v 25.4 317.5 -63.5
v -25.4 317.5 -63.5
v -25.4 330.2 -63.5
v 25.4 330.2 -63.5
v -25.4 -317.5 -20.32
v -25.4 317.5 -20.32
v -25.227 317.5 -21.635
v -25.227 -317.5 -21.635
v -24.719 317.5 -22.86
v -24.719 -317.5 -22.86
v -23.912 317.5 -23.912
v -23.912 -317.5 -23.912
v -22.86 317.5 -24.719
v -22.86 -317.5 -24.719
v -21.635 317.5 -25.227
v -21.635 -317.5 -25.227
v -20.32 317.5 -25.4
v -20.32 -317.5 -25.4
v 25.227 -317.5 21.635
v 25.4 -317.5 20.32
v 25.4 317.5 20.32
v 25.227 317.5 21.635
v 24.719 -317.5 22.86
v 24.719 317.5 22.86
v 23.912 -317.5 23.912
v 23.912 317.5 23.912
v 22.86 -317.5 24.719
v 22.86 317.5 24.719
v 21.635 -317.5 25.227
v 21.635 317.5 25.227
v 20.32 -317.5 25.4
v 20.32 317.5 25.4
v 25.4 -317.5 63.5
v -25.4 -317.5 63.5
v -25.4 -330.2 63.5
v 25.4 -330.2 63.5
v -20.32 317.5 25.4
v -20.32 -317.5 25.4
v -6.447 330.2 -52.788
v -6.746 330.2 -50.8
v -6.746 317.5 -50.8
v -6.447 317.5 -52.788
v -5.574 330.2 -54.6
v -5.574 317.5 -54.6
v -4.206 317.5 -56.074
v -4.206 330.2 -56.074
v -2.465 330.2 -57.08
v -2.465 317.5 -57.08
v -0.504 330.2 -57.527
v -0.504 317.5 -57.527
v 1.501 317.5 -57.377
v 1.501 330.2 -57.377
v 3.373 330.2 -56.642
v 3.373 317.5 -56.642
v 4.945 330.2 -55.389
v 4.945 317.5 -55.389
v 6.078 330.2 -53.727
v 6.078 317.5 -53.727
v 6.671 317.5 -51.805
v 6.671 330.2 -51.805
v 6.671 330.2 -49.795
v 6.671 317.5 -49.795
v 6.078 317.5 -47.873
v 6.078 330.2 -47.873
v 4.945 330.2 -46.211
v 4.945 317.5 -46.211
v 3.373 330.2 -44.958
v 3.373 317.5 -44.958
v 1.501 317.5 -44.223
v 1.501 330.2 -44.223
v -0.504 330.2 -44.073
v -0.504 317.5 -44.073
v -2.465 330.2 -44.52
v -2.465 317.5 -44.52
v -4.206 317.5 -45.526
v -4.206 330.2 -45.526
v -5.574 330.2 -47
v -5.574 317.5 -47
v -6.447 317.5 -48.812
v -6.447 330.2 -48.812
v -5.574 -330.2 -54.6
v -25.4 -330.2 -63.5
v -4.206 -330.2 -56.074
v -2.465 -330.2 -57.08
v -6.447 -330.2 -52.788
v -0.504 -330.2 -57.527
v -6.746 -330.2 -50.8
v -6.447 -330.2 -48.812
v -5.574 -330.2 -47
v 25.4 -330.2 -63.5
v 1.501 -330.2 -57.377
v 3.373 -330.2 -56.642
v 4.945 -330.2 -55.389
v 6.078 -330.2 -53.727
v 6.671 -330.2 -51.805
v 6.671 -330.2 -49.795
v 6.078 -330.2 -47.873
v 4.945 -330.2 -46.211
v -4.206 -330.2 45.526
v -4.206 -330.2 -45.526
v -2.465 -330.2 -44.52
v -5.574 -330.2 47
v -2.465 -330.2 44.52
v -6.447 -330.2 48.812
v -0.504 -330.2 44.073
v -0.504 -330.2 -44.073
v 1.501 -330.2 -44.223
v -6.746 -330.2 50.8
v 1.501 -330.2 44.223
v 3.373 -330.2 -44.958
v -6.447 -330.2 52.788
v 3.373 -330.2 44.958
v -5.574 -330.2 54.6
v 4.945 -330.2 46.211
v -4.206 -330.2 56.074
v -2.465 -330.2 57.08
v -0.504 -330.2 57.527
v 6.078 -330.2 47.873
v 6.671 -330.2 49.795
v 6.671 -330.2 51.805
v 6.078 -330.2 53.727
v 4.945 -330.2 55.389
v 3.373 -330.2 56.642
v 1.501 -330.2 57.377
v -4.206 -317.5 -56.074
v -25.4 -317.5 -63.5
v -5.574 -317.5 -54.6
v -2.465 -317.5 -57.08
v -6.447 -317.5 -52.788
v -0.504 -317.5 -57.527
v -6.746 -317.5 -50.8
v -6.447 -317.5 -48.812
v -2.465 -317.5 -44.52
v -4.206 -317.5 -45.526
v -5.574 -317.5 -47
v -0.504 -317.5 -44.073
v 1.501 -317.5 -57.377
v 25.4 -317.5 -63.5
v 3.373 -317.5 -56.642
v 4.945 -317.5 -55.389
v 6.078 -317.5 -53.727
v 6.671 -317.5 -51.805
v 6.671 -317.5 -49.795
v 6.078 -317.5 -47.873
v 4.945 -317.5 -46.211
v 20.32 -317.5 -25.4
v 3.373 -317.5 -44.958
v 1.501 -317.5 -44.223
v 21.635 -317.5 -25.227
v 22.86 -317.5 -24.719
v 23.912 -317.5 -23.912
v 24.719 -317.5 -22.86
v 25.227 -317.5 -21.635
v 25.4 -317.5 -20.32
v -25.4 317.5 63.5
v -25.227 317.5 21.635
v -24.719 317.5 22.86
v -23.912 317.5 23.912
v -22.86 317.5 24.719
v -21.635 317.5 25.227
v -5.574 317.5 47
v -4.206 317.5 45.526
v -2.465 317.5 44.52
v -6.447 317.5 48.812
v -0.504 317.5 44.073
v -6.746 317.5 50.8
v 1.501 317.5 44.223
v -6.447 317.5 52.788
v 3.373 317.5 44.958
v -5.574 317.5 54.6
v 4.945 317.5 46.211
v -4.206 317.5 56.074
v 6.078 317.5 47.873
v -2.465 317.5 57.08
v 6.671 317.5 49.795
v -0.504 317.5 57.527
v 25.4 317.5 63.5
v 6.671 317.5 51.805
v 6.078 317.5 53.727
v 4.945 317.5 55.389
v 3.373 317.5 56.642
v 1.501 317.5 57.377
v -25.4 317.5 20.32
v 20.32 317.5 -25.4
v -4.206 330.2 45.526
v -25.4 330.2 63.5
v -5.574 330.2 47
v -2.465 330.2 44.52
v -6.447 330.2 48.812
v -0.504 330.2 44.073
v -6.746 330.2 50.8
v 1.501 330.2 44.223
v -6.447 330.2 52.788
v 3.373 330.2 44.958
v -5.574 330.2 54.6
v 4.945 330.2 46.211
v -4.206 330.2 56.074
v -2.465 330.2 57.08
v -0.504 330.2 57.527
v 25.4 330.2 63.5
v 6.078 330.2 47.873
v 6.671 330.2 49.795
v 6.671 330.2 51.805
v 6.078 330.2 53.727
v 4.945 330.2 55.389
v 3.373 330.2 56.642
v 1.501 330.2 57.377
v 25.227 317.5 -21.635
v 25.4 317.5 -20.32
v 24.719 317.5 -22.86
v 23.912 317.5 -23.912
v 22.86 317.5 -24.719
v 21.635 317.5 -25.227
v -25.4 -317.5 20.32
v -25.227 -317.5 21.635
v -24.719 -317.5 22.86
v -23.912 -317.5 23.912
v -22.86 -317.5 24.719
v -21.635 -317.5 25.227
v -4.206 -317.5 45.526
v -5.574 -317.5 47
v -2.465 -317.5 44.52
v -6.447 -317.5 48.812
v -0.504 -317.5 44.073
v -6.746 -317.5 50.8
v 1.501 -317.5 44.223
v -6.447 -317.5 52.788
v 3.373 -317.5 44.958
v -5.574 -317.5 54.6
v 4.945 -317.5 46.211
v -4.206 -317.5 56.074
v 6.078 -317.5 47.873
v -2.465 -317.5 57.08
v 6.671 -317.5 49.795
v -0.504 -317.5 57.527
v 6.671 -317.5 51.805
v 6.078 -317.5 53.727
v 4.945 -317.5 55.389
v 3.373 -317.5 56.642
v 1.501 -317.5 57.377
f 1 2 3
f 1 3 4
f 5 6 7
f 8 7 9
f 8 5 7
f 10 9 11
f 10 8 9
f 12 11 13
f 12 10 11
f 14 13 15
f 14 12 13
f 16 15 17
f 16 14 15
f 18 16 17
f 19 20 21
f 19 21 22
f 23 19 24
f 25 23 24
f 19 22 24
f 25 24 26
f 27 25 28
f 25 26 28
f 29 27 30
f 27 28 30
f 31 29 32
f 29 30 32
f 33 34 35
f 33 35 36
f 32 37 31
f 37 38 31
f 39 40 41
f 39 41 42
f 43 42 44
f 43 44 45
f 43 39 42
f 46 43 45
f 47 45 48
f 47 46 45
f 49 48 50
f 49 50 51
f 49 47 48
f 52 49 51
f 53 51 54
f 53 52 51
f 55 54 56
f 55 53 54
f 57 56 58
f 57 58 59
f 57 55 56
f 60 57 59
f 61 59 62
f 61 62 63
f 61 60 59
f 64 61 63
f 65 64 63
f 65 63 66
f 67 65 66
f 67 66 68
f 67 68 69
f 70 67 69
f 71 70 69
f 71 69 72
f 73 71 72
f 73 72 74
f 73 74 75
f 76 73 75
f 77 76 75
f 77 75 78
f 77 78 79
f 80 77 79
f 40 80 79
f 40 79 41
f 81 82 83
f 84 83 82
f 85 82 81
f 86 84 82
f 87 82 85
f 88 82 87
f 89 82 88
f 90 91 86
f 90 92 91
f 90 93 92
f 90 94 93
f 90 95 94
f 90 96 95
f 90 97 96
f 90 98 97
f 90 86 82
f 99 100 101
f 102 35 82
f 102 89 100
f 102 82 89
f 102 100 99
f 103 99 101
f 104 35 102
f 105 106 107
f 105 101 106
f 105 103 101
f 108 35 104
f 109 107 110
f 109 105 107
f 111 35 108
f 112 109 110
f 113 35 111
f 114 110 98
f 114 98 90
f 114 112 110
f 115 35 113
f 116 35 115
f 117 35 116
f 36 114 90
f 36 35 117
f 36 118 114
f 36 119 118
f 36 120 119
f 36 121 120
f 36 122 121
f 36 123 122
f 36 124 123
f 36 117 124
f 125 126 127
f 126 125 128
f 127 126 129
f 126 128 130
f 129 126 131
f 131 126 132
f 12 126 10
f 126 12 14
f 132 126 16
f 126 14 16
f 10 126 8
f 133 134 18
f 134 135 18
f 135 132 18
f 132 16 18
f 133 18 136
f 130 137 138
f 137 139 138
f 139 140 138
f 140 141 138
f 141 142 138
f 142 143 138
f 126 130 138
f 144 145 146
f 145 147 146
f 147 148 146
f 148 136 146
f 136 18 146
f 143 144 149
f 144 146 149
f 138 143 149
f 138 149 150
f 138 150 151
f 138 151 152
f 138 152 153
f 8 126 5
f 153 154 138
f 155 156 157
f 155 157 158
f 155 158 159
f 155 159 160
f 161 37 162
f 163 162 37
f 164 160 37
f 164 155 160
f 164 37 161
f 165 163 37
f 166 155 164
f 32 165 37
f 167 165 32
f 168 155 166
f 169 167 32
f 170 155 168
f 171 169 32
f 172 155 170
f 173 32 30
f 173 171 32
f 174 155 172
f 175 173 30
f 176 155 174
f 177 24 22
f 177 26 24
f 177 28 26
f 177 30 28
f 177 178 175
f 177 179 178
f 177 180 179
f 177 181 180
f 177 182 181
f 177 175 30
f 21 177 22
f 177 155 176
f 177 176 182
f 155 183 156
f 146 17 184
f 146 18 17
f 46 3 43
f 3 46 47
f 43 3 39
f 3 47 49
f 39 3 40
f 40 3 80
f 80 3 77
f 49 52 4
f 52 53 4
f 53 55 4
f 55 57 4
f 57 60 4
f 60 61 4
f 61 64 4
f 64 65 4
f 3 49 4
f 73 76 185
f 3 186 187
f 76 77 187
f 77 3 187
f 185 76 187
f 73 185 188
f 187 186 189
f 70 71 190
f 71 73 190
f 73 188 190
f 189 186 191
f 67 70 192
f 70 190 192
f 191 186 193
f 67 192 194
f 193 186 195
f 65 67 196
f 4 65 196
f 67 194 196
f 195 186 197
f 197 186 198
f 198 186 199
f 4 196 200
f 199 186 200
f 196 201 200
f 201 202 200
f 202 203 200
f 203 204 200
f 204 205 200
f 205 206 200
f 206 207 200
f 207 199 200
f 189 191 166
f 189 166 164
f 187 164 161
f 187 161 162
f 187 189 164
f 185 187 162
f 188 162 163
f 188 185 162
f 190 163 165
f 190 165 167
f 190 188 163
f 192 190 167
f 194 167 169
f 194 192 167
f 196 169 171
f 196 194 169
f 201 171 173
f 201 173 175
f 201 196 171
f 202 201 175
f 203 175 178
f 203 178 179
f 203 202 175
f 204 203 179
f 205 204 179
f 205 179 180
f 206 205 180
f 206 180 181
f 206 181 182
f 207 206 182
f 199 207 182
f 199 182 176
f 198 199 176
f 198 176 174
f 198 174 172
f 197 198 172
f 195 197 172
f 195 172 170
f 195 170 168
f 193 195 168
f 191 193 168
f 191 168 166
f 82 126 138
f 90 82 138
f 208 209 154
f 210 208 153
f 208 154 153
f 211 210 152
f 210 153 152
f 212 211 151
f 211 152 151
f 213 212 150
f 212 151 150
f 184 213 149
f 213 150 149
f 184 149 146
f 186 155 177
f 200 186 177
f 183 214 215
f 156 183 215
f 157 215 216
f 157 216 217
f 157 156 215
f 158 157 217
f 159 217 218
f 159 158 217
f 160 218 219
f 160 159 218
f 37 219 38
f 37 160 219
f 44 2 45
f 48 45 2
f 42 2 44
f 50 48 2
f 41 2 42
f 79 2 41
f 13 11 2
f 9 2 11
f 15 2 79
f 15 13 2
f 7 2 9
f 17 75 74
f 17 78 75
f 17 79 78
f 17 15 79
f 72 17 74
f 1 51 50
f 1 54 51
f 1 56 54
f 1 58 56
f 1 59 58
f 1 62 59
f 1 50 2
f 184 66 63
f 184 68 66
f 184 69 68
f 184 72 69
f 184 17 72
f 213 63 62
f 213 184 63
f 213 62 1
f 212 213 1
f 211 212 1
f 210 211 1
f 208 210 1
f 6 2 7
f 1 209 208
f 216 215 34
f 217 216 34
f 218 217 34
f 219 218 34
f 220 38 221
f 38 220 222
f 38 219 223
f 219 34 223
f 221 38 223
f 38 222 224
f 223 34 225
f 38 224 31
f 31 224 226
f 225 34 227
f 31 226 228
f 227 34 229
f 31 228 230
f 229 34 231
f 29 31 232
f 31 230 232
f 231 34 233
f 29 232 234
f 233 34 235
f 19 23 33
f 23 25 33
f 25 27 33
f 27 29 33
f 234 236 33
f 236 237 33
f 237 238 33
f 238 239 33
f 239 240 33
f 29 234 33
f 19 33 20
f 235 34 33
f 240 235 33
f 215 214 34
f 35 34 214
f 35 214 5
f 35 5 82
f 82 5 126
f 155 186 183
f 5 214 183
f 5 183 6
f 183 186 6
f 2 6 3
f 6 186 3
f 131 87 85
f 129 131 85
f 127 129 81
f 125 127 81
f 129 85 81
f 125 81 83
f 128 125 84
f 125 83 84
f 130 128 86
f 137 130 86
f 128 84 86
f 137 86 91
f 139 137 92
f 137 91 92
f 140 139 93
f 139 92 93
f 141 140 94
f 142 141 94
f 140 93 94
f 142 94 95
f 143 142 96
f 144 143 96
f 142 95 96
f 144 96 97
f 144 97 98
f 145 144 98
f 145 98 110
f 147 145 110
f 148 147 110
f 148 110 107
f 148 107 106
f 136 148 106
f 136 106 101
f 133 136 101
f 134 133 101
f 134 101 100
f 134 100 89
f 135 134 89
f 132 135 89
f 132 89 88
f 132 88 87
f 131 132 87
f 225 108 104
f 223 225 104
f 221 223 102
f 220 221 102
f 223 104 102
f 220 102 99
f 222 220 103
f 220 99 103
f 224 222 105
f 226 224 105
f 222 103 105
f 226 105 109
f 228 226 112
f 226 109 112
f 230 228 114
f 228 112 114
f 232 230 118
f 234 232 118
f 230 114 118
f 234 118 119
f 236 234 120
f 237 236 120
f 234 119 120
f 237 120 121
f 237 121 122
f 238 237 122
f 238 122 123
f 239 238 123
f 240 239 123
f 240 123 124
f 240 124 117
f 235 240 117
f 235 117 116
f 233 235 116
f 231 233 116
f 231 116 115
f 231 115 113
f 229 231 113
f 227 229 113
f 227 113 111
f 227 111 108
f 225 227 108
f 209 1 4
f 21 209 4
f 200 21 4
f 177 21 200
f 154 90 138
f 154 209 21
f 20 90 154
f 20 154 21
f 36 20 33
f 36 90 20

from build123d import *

# Parameters (mm, degrees)
F0_W     = 50.8
F0_H     = 50.8
F1_DEPTH = 317.5
F2_W     = 50.8
F2_H     = 38.1
F2_H_2   = 50.8
F3_DEPTH = 12.7
F4_R     = 5.08
F5_D     = 13.49248


with BuildPart() as f1:
    # F0 (on Front) → F1 (new body, symmetric)
    with BuildSketch(Plane.XZ):
        Rectangle(F0_W, F0_H)
    extrude(amount=F1_DEPTH, both=True)

    # F2 (on face) → F3 (join)
    with BuildSketch(Plane.XZ.offset(317.5)):
        with Locations((0, 44.45)):
            Rectangle(F2_W, F2_H)
        Rectangle(F2_W, F2_H_2)
        with Locations((0, -44.45)):
            Rectangle(F2_W, F2_H)
    extrude(amount=F3_DEPTH)

    # F4
    f4_edges = [f1.edges().sort_by_distance(p)[0] for p in [
        (25.4, 0, 25.4),
        (-25.4, 0, 25.4),
        (-25.4, 0, -25.4),
        (25.4, 0, -25.4),
    ]]
    fillet(f4_edges, radius=F4_R)

    # F5 (through all)
    with Locations(Plane(origin=(0, -317.5, 0), x_dir=(1, 0, 0), z_dir=(0, 1, 0))):
        with Locations((0, -50.8), (0, 50.8)):
            Hole(F5_D / 2)

    # F6: F1 across plane


with BuildPart() as f1_1:
    add(f1.part)
    add(f1.part.mirror(Plane.XZ))


solid = f1_1.part
